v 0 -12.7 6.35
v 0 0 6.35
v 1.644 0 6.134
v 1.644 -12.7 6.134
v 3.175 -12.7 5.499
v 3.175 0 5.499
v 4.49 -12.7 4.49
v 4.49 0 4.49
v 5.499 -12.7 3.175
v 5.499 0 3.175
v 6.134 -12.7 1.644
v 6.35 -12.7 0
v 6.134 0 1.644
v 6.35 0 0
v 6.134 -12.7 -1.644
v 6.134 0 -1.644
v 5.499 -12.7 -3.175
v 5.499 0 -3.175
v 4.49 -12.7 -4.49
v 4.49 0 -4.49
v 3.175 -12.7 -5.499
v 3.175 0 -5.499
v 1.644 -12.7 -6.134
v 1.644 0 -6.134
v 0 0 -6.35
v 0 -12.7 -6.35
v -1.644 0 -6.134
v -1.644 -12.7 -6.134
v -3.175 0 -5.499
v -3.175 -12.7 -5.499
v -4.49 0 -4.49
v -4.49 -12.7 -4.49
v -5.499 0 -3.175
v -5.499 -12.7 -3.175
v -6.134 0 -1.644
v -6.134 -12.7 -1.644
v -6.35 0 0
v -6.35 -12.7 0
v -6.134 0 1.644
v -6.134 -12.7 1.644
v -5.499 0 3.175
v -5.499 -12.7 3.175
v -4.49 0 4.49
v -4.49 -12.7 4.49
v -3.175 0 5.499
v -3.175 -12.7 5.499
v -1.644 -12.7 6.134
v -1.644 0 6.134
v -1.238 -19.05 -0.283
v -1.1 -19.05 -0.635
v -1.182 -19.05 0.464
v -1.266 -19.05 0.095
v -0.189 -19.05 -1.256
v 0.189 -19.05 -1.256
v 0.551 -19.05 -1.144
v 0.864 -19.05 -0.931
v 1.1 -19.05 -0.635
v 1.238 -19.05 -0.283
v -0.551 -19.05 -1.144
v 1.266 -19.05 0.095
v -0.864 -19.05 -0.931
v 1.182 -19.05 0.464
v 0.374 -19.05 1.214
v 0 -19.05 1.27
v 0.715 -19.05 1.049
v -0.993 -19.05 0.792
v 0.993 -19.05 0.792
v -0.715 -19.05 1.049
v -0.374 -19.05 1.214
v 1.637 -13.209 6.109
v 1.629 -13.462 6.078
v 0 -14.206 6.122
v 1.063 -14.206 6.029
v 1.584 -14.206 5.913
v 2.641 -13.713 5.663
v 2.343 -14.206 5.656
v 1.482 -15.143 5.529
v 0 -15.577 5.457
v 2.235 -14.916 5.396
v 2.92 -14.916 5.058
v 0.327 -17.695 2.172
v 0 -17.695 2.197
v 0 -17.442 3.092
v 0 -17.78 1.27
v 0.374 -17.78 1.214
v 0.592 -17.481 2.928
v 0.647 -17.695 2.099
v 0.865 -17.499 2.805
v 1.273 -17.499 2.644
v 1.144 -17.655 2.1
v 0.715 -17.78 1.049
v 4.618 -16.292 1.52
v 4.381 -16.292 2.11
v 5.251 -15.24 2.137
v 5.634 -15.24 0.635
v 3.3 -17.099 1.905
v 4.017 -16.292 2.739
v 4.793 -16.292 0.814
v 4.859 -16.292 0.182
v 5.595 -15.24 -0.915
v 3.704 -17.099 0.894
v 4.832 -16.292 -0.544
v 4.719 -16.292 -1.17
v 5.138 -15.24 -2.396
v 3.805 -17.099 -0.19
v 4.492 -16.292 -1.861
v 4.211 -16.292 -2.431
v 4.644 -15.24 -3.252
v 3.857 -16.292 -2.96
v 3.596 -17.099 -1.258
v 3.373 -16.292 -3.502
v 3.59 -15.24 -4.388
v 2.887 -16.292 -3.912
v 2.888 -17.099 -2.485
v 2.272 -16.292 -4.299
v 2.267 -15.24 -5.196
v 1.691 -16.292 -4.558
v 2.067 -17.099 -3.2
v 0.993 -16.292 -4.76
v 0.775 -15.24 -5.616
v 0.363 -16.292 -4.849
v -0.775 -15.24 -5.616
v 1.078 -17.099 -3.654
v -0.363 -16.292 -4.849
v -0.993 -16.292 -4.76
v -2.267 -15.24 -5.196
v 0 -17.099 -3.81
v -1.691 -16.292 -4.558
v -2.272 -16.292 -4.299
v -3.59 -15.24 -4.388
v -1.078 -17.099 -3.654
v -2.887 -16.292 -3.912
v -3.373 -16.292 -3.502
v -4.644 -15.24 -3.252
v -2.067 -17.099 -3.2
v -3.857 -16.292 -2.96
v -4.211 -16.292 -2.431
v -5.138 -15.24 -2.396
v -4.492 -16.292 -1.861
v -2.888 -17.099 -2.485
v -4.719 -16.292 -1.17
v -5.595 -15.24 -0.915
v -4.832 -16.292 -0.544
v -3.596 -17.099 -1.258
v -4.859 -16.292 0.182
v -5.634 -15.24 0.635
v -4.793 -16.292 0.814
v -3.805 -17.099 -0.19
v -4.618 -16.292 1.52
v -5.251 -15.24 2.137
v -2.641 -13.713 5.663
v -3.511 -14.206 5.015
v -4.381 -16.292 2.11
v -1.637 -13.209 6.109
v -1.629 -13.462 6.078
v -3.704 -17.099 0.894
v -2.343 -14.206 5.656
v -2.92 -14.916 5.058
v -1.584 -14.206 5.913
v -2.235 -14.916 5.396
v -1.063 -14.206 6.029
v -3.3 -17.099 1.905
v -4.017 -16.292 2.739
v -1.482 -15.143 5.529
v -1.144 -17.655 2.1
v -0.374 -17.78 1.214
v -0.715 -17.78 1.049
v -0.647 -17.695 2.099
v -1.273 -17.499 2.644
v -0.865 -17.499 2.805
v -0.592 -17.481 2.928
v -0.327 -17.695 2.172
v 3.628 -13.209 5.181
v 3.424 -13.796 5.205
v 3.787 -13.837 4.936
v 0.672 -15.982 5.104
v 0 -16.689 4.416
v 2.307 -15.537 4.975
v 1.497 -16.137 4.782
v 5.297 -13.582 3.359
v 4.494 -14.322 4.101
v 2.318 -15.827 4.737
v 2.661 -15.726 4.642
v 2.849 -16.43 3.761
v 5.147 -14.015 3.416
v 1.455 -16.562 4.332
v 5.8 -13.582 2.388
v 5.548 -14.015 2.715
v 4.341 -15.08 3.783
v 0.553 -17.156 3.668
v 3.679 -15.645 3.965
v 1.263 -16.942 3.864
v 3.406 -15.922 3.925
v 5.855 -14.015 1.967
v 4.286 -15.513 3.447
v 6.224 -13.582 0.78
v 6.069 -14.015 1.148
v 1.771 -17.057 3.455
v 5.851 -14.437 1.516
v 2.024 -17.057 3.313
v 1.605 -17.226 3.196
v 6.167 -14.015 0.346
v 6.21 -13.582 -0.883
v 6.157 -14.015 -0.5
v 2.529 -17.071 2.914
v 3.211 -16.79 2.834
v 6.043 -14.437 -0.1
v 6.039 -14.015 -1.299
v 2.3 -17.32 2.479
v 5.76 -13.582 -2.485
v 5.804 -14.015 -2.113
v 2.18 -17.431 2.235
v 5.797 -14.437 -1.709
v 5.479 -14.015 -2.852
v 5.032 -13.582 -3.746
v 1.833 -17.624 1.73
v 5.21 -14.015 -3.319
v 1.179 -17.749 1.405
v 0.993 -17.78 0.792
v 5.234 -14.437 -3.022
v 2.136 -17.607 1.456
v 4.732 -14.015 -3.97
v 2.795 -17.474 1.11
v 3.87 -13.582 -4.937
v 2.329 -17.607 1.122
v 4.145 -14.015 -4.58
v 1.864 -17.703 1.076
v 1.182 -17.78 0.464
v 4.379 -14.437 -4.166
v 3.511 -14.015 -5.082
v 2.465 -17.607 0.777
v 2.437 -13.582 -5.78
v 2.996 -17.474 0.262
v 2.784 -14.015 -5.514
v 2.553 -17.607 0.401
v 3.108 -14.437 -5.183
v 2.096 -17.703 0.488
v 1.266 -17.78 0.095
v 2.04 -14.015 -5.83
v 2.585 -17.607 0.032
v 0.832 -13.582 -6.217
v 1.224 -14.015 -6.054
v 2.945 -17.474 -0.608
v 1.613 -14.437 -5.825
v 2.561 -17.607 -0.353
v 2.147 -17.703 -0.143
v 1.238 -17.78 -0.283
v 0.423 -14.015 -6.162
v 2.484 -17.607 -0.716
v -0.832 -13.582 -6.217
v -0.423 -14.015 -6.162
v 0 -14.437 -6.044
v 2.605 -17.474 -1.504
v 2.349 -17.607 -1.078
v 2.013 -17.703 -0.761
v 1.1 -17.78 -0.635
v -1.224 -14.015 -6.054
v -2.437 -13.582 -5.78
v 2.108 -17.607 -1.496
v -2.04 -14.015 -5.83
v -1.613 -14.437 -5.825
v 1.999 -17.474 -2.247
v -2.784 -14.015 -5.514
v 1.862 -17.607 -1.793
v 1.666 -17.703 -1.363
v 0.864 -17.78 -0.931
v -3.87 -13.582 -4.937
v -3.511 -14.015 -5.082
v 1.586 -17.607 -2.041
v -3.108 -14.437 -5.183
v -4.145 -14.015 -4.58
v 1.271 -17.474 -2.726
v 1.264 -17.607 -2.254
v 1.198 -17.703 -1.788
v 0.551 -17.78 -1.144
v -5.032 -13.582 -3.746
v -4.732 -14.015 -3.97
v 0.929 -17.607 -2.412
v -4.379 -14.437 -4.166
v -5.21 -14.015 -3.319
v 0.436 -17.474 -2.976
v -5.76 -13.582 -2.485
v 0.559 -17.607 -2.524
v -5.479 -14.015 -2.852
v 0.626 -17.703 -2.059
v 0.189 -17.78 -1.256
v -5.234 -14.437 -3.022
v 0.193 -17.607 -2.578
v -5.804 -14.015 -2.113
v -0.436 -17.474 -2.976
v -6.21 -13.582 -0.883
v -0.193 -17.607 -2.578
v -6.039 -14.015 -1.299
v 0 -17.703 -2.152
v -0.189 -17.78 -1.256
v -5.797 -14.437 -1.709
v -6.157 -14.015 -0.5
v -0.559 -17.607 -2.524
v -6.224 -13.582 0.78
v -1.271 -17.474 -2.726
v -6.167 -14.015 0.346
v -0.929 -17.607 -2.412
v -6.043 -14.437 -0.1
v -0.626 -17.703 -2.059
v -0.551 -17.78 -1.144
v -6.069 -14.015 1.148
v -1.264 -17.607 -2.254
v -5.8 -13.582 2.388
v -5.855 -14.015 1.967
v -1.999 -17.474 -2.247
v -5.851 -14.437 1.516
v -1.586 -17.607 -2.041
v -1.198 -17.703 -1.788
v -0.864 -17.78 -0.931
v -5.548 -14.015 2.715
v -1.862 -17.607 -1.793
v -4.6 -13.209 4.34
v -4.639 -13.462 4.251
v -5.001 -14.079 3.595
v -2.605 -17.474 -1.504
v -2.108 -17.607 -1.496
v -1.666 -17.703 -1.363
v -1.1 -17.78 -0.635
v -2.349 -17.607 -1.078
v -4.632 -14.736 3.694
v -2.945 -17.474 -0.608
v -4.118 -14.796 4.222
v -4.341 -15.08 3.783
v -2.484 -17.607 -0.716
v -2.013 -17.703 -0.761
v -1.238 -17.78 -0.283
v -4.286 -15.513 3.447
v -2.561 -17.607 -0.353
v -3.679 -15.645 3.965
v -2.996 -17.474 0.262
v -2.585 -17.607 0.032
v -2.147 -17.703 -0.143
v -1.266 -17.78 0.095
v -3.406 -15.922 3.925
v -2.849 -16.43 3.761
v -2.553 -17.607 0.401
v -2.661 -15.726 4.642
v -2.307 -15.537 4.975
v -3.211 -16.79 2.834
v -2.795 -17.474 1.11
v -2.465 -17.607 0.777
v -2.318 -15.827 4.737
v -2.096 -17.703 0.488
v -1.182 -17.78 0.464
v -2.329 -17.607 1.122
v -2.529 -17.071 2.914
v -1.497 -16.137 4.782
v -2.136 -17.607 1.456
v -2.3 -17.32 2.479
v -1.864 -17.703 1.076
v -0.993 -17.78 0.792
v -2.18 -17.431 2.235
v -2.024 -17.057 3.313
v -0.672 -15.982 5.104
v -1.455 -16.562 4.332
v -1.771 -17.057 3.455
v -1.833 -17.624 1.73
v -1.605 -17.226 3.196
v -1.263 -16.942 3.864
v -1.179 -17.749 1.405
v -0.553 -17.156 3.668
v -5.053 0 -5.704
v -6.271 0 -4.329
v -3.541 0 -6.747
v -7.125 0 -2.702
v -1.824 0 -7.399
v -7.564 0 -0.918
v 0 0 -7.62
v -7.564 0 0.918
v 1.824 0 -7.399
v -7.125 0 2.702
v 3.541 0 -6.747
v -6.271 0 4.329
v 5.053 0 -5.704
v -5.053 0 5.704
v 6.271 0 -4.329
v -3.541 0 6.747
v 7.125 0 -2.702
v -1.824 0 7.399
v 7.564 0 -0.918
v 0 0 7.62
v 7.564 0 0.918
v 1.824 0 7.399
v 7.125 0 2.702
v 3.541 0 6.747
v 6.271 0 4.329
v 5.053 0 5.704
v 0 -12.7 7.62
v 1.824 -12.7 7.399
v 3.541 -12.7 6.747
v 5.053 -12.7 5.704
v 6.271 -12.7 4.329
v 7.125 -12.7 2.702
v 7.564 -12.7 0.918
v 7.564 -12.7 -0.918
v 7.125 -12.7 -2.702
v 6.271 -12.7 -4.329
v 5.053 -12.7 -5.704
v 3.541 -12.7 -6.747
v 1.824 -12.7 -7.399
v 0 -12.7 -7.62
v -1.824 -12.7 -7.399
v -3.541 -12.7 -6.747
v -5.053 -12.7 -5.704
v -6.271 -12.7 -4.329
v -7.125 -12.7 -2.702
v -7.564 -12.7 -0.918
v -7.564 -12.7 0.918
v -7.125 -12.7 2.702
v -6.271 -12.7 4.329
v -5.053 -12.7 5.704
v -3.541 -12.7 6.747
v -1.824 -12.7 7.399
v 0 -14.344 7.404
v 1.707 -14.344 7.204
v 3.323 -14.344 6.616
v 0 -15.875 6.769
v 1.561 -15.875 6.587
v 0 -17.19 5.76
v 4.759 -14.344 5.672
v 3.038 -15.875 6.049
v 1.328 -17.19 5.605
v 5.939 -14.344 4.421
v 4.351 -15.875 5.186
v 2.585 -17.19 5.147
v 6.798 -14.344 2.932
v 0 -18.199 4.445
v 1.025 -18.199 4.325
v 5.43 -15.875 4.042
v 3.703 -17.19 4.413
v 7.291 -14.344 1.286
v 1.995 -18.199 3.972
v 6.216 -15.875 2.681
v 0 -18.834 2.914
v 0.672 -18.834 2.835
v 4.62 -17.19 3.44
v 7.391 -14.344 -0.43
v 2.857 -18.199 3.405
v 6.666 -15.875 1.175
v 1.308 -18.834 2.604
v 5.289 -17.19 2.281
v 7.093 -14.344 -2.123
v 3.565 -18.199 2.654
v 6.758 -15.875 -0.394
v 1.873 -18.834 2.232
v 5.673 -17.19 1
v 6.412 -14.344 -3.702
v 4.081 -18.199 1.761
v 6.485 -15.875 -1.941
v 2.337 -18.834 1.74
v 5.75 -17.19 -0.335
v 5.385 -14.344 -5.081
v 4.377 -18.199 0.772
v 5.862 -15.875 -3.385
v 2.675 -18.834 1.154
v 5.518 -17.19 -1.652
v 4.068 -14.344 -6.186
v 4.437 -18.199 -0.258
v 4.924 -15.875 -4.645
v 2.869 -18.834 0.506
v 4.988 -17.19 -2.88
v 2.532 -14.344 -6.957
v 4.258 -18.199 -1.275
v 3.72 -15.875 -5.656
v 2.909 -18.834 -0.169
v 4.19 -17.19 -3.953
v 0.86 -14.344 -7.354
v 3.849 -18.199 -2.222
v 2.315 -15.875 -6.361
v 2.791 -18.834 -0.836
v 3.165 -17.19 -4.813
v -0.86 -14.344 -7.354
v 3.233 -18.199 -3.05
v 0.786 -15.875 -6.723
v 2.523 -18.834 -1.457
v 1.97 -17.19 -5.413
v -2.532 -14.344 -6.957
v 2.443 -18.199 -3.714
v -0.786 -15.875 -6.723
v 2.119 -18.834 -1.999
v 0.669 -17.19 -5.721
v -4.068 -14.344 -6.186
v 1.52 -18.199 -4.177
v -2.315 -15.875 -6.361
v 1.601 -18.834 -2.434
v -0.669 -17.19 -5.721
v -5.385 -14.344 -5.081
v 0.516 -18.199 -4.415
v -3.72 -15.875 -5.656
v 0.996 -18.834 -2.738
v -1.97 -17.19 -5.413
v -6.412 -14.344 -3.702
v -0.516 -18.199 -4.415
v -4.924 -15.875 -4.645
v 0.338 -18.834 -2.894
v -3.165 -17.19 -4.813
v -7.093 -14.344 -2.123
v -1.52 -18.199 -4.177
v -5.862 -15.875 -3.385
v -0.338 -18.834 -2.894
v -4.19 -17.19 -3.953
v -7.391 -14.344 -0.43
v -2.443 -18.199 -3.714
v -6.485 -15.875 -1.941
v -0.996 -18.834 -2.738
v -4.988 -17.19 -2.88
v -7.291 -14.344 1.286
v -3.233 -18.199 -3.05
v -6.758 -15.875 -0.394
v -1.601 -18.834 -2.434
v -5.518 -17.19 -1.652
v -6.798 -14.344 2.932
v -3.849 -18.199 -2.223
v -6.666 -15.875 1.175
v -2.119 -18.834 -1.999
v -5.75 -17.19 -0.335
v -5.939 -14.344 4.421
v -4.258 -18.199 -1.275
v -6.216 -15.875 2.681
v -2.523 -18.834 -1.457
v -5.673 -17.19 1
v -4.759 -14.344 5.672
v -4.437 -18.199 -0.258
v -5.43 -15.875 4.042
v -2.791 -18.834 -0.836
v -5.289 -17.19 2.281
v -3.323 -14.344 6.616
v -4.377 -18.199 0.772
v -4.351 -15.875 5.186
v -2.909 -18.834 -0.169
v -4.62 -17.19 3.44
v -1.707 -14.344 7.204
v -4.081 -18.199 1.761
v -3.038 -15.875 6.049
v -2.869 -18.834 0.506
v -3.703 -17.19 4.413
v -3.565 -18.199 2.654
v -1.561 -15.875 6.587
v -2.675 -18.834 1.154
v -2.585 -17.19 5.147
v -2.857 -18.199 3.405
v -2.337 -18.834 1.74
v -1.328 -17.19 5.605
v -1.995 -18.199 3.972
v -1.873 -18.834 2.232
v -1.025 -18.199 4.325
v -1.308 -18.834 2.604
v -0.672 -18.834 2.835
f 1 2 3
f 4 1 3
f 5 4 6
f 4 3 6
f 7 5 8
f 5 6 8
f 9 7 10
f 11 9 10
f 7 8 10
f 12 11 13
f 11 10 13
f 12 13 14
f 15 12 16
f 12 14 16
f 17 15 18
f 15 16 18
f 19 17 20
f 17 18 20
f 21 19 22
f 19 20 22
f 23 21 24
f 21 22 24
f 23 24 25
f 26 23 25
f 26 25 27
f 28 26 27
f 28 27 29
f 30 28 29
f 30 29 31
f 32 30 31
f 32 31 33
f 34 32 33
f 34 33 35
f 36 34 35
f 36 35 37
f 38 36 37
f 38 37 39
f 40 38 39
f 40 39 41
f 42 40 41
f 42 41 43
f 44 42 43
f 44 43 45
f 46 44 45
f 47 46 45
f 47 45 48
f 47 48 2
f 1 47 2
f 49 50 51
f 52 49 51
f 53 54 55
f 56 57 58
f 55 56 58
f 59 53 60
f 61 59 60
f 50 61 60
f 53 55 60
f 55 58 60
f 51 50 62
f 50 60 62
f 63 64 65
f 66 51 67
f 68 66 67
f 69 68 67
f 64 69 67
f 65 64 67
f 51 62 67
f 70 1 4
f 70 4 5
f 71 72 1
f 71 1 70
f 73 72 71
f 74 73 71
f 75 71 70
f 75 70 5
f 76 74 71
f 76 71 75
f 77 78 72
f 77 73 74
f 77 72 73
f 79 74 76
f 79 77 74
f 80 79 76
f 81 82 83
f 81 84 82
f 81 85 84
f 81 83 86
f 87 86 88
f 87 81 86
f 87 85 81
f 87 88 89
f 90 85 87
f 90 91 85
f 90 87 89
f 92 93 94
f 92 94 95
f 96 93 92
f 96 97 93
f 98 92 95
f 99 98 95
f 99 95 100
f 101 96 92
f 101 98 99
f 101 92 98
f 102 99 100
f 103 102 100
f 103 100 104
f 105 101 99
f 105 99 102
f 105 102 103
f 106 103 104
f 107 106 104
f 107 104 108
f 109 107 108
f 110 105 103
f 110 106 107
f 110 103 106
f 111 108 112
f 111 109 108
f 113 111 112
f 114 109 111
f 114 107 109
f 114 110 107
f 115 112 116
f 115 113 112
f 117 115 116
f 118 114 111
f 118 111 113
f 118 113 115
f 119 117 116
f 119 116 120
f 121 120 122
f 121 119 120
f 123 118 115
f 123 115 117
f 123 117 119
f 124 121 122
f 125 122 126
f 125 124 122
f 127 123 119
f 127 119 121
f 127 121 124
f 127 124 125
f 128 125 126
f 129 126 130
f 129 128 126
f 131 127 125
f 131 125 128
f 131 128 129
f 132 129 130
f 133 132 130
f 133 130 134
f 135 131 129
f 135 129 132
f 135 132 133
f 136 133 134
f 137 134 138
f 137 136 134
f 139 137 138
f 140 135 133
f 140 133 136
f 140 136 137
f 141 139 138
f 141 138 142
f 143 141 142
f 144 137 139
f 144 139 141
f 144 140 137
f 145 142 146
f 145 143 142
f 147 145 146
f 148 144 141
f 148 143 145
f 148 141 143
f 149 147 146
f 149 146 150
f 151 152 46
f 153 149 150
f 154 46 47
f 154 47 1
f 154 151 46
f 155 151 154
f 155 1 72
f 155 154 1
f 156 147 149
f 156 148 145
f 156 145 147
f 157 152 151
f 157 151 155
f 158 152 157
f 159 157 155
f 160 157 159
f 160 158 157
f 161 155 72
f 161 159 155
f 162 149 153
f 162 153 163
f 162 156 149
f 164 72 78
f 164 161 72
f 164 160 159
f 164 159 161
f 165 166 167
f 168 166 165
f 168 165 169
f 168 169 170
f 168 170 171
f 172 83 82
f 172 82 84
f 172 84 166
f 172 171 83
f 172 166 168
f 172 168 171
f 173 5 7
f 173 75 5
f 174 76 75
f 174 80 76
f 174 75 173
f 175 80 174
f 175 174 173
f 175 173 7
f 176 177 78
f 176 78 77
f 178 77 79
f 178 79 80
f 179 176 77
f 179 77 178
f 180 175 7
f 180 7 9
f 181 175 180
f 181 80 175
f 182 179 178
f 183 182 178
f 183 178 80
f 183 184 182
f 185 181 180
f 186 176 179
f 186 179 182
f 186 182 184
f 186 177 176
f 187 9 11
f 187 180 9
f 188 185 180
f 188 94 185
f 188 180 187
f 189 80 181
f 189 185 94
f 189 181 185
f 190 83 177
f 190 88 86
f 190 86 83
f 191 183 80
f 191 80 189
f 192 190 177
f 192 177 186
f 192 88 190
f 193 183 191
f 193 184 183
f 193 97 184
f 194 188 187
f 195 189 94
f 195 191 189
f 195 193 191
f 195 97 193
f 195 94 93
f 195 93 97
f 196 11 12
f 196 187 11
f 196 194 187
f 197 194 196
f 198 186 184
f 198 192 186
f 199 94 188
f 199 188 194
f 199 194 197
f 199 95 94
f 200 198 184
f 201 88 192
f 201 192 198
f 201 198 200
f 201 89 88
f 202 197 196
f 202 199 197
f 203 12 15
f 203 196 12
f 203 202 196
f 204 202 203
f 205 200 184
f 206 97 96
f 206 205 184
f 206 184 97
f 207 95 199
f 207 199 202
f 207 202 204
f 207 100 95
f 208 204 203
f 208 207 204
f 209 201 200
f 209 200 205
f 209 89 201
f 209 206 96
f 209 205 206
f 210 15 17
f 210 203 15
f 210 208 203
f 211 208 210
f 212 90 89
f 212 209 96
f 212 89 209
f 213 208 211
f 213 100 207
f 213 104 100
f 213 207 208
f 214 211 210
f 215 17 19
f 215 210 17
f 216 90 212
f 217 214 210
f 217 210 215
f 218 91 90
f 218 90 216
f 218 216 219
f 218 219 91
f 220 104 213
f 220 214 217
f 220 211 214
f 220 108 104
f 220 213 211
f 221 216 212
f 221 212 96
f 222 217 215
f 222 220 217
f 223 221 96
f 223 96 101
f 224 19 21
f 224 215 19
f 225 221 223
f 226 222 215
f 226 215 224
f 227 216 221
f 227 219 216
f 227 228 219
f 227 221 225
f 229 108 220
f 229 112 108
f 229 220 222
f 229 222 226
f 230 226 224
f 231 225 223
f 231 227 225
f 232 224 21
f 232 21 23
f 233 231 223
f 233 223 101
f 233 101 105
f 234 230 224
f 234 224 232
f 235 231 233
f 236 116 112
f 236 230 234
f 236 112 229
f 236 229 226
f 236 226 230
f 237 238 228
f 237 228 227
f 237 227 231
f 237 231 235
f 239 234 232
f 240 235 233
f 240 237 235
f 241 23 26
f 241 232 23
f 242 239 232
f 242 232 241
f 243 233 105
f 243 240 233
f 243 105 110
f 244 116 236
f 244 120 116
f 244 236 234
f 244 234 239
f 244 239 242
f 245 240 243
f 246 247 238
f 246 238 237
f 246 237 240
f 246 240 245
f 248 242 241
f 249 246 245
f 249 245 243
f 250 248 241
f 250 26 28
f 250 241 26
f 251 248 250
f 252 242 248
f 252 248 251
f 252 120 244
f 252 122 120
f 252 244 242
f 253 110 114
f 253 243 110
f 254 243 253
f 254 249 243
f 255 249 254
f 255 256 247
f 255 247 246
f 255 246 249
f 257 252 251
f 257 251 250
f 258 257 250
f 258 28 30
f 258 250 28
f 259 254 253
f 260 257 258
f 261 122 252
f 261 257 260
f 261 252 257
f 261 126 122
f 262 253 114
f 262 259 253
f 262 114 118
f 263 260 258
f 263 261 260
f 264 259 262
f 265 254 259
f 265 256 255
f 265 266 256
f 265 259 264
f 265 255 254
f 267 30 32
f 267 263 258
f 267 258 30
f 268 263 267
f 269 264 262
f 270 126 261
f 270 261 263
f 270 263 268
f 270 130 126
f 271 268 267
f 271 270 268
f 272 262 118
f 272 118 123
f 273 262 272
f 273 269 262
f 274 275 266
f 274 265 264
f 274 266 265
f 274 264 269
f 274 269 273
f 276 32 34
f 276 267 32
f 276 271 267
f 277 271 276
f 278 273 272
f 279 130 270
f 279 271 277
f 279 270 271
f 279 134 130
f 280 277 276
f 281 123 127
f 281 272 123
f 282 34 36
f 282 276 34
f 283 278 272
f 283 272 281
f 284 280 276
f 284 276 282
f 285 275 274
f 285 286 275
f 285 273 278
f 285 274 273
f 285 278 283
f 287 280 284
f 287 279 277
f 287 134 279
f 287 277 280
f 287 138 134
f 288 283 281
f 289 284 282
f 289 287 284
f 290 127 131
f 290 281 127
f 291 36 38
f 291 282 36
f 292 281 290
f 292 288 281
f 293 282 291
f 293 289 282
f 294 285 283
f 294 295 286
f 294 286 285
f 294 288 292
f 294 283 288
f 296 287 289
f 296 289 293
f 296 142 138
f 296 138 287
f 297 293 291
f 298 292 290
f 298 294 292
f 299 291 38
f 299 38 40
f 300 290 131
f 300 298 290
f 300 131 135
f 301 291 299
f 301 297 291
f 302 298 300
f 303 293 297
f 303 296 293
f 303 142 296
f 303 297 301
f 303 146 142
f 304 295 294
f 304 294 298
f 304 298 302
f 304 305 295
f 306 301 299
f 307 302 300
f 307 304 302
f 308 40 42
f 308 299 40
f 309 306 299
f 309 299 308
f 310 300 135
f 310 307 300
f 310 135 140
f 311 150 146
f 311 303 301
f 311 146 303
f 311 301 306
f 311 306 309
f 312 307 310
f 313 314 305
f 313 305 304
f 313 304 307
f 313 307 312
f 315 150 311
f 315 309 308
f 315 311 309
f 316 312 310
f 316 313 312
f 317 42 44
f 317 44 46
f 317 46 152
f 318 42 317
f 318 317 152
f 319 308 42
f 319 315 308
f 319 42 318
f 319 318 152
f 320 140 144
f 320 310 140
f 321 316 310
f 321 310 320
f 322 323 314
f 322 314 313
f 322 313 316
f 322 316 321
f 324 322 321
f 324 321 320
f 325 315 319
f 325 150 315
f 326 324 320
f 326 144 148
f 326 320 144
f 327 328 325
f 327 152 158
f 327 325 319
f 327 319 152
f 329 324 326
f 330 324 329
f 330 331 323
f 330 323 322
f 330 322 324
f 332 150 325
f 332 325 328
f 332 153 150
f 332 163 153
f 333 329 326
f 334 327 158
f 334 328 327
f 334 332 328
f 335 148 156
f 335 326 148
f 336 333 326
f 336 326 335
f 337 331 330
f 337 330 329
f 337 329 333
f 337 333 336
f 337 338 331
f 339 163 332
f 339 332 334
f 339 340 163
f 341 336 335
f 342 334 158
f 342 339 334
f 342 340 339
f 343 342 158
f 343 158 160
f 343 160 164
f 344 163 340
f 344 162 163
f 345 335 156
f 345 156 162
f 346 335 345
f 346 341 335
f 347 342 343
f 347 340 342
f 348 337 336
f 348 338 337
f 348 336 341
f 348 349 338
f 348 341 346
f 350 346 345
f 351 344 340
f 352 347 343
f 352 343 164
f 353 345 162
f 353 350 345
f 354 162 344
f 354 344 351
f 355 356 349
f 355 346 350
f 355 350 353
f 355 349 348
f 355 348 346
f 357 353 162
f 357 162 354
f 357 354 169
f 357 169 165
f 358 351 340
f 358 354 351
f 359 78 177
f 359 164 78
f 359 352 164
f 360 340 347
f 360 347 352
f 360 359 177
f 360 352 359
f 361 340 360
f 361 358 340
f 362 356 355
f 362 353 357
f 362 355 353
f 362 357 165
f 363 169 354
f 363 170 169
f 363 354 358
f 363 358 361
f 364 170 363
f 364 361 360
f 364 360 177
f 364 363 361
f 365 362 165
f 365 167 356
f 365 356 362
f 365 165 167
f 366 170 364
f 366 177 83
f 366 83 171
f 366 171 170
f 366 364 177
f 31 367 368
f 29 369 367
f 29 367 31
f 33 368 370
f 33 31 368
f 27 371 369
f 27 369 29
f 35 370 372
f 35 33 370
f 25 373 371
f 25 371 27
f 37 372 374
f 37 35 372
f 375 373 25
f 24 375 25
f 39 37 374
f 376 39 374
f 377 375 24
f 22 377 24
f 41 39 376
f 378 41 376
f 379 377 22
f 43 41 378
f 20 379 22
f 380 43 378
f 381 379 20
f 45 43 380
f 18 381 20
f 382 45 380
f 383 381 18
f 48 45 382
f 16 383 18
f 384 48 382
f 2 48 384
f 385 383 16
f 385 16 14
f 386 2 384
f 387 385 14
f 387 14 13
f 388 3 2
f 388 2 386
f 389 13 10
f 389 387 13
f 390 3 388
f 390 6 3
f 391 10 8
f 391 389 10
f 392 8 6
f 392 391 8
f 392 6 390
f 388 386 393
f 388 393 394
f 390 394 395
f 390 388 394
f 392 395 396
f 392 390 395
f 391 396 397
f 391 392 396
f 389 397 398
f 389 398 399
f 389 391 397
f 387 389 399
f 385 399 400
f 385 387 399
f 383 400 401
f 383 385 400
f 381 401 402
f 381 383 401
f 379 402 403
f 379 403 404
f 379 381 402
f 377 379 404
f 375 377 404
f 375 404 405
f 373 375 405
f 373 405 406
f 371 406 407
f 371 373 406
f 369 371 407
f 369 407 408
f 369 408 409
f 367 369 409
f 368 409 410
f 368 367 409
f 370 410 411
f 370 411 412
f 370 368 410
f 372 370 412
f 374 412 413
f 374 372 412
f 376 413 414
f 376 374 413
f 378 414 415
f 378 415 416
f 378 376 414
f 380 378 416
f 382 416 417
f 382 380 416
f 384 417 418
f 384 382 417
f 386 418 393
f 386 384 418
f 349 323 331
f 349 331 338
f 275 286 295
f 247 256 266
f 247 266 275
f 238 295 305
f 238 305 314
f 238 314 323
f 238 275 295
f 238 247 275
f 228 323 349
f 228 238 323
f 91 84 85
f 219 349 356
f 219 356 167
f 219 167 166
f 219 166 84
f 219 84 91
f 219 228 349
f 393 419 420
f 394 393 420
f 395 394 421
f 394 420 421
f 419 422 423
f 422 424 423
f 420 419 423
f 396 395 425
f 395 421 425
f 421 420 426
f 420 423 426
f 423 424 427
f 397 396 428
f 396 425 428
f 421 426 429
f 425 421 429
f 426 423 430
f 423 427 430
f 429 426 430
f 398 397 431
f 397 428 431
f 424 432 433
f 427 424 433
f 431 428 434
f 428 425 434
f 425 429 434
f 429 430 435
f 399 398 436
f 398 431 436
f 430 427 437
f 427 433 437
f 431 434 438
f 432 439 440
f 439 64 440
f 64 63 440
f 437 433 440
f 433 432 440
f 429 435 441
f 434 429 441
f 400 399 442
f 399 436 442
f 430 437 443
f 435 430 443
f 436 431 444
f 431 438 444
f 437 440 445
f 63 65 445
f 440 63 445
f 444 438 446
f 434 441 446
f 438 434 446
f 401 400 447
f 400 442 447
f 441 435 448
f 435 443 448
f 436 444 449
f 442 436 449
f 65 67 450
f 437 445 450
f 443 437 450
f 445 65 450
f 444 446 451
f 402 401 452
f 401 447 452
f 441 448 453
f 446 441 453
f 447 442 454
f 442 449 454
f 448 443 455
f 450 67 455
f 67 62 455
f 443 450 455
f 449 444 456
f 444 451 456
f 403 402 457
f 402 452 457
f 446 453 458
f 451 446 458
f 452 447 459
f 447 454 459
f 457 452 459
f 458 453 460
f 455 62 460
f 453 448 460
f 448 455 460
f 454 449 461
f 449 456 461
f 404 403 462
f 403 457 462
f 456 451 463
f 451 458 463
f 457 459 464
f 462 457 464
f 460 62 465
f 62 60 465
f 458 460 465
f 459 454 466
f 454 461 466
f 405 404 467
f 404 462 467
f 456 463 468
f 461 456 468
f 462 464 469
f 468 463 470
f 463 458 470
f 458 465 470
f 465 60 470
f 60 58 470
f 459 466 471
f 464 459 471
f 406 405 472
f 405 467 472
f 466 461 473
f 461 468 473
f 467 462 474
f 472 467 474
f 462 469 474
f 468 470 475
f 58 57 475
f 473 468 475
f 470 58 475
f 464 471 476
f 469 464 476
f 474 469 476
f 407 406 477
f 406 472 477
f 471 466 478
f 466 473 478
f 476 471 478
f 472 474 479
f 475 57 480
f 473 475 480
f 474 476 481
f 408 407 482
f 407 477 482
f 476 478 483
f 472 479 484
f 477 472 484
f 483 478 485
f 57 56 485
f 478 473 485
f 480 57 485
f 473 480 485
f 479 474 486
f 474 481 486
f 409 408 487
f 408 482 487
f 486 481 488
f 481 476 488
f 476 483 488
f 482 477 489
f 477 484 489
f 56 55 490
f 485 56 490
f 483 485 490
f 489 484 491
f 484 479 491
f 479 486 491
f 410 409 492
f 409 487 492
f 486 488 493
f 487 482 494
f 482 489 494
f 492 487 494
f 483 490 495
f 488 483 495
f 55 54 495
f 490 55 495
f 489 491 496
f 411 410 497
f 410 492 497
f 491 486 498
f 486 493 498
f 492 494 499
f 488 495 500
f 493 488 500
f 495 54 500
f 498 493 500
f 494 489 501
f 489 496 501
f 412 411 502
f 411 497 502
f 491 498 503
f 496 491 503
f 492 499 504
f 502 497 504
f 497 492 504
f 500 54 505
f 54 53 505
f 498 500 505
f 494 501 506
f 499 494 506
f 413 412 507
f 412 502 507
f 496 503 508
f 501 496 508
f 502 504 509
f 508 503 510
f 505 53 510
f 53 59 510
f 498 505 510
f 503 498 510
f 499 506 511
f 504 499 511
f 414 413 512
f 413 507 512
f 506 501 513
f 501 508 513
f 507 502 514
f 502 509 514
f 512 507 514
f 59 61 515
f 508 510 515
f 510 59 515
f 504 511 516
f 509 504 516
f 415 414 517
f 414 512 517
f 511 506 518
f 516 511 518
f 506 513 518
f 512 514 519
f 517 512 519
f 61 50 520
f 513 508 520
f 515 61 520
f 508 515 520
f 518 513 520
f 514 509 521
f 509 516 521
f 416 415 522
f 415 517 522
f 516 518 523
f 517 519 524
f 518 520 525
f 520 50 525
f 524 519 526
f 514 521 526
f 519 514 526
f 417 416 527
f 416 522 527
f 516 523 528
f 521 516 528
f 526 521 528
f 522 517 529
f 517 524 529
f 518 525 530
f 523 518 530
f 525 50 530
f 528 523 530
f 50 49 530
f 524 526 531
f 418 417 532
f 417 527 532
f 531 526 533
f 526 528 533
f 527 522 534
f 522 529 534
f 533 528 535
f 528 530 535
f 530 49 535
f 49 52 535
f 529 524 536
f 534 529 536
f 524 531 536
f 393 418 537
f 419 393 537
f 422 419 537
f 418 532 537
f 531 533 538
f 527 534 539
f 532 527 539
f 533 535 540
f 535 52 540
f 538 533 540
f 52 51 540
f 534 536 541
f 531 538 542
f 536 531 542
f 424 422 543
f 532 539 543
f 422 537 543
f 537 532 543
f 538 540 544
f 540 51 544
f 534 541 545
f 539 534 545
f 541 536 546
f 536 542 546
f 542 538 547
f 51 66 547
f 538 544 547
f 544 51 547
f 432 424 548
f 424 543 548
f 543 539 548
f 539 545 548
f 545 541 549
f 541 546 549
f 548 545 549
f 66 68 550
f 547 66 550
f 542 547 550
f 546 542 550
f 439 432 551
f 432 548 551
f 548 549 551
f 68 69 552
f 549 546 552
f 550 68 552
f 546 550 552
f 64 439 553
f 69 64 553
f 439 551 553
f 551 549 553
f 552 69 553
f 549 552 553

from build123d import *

# Parameters (mm, degrees)
SKETCH1_R           = 7.62
BOSS_EXTRUDE1_DEPTH = 19.05
FILLET1_R           = 6.35
SHELL1_T            = -1.27


with BuildPart() as part:
    # Sketch1 → Boss-Extrude1 (new body)
    with BuildSketch(Plane(origin=(0, 0, 0), x_dir=(1, 0, 0), z_dir=(0, 1, 0))):
        with Locations(Location((0, 0, 0), (0, 0, 270))):
            Circle(SKETCH1_R)
    extrude(amount=-BOSS_EXTRUDE1_DEPTH)

    # Fillet1
    fillet1_edges = [part.edges().sort_by_distance(p)[0] for p in [
        (0, -19.05, -7.62),
    ]]
    fillet(fillet1_edges, radius=FILLET1_R)

    # Shell1
    shell1_openings = [part.faces().sort_by_distance(p)[0] for p in [
        (0, 0, 0),
    ]]
    offset(amount=SHELL1_T, openings=shell1_openings, kind=Kind.INTERSECTION)


solid = part.part
